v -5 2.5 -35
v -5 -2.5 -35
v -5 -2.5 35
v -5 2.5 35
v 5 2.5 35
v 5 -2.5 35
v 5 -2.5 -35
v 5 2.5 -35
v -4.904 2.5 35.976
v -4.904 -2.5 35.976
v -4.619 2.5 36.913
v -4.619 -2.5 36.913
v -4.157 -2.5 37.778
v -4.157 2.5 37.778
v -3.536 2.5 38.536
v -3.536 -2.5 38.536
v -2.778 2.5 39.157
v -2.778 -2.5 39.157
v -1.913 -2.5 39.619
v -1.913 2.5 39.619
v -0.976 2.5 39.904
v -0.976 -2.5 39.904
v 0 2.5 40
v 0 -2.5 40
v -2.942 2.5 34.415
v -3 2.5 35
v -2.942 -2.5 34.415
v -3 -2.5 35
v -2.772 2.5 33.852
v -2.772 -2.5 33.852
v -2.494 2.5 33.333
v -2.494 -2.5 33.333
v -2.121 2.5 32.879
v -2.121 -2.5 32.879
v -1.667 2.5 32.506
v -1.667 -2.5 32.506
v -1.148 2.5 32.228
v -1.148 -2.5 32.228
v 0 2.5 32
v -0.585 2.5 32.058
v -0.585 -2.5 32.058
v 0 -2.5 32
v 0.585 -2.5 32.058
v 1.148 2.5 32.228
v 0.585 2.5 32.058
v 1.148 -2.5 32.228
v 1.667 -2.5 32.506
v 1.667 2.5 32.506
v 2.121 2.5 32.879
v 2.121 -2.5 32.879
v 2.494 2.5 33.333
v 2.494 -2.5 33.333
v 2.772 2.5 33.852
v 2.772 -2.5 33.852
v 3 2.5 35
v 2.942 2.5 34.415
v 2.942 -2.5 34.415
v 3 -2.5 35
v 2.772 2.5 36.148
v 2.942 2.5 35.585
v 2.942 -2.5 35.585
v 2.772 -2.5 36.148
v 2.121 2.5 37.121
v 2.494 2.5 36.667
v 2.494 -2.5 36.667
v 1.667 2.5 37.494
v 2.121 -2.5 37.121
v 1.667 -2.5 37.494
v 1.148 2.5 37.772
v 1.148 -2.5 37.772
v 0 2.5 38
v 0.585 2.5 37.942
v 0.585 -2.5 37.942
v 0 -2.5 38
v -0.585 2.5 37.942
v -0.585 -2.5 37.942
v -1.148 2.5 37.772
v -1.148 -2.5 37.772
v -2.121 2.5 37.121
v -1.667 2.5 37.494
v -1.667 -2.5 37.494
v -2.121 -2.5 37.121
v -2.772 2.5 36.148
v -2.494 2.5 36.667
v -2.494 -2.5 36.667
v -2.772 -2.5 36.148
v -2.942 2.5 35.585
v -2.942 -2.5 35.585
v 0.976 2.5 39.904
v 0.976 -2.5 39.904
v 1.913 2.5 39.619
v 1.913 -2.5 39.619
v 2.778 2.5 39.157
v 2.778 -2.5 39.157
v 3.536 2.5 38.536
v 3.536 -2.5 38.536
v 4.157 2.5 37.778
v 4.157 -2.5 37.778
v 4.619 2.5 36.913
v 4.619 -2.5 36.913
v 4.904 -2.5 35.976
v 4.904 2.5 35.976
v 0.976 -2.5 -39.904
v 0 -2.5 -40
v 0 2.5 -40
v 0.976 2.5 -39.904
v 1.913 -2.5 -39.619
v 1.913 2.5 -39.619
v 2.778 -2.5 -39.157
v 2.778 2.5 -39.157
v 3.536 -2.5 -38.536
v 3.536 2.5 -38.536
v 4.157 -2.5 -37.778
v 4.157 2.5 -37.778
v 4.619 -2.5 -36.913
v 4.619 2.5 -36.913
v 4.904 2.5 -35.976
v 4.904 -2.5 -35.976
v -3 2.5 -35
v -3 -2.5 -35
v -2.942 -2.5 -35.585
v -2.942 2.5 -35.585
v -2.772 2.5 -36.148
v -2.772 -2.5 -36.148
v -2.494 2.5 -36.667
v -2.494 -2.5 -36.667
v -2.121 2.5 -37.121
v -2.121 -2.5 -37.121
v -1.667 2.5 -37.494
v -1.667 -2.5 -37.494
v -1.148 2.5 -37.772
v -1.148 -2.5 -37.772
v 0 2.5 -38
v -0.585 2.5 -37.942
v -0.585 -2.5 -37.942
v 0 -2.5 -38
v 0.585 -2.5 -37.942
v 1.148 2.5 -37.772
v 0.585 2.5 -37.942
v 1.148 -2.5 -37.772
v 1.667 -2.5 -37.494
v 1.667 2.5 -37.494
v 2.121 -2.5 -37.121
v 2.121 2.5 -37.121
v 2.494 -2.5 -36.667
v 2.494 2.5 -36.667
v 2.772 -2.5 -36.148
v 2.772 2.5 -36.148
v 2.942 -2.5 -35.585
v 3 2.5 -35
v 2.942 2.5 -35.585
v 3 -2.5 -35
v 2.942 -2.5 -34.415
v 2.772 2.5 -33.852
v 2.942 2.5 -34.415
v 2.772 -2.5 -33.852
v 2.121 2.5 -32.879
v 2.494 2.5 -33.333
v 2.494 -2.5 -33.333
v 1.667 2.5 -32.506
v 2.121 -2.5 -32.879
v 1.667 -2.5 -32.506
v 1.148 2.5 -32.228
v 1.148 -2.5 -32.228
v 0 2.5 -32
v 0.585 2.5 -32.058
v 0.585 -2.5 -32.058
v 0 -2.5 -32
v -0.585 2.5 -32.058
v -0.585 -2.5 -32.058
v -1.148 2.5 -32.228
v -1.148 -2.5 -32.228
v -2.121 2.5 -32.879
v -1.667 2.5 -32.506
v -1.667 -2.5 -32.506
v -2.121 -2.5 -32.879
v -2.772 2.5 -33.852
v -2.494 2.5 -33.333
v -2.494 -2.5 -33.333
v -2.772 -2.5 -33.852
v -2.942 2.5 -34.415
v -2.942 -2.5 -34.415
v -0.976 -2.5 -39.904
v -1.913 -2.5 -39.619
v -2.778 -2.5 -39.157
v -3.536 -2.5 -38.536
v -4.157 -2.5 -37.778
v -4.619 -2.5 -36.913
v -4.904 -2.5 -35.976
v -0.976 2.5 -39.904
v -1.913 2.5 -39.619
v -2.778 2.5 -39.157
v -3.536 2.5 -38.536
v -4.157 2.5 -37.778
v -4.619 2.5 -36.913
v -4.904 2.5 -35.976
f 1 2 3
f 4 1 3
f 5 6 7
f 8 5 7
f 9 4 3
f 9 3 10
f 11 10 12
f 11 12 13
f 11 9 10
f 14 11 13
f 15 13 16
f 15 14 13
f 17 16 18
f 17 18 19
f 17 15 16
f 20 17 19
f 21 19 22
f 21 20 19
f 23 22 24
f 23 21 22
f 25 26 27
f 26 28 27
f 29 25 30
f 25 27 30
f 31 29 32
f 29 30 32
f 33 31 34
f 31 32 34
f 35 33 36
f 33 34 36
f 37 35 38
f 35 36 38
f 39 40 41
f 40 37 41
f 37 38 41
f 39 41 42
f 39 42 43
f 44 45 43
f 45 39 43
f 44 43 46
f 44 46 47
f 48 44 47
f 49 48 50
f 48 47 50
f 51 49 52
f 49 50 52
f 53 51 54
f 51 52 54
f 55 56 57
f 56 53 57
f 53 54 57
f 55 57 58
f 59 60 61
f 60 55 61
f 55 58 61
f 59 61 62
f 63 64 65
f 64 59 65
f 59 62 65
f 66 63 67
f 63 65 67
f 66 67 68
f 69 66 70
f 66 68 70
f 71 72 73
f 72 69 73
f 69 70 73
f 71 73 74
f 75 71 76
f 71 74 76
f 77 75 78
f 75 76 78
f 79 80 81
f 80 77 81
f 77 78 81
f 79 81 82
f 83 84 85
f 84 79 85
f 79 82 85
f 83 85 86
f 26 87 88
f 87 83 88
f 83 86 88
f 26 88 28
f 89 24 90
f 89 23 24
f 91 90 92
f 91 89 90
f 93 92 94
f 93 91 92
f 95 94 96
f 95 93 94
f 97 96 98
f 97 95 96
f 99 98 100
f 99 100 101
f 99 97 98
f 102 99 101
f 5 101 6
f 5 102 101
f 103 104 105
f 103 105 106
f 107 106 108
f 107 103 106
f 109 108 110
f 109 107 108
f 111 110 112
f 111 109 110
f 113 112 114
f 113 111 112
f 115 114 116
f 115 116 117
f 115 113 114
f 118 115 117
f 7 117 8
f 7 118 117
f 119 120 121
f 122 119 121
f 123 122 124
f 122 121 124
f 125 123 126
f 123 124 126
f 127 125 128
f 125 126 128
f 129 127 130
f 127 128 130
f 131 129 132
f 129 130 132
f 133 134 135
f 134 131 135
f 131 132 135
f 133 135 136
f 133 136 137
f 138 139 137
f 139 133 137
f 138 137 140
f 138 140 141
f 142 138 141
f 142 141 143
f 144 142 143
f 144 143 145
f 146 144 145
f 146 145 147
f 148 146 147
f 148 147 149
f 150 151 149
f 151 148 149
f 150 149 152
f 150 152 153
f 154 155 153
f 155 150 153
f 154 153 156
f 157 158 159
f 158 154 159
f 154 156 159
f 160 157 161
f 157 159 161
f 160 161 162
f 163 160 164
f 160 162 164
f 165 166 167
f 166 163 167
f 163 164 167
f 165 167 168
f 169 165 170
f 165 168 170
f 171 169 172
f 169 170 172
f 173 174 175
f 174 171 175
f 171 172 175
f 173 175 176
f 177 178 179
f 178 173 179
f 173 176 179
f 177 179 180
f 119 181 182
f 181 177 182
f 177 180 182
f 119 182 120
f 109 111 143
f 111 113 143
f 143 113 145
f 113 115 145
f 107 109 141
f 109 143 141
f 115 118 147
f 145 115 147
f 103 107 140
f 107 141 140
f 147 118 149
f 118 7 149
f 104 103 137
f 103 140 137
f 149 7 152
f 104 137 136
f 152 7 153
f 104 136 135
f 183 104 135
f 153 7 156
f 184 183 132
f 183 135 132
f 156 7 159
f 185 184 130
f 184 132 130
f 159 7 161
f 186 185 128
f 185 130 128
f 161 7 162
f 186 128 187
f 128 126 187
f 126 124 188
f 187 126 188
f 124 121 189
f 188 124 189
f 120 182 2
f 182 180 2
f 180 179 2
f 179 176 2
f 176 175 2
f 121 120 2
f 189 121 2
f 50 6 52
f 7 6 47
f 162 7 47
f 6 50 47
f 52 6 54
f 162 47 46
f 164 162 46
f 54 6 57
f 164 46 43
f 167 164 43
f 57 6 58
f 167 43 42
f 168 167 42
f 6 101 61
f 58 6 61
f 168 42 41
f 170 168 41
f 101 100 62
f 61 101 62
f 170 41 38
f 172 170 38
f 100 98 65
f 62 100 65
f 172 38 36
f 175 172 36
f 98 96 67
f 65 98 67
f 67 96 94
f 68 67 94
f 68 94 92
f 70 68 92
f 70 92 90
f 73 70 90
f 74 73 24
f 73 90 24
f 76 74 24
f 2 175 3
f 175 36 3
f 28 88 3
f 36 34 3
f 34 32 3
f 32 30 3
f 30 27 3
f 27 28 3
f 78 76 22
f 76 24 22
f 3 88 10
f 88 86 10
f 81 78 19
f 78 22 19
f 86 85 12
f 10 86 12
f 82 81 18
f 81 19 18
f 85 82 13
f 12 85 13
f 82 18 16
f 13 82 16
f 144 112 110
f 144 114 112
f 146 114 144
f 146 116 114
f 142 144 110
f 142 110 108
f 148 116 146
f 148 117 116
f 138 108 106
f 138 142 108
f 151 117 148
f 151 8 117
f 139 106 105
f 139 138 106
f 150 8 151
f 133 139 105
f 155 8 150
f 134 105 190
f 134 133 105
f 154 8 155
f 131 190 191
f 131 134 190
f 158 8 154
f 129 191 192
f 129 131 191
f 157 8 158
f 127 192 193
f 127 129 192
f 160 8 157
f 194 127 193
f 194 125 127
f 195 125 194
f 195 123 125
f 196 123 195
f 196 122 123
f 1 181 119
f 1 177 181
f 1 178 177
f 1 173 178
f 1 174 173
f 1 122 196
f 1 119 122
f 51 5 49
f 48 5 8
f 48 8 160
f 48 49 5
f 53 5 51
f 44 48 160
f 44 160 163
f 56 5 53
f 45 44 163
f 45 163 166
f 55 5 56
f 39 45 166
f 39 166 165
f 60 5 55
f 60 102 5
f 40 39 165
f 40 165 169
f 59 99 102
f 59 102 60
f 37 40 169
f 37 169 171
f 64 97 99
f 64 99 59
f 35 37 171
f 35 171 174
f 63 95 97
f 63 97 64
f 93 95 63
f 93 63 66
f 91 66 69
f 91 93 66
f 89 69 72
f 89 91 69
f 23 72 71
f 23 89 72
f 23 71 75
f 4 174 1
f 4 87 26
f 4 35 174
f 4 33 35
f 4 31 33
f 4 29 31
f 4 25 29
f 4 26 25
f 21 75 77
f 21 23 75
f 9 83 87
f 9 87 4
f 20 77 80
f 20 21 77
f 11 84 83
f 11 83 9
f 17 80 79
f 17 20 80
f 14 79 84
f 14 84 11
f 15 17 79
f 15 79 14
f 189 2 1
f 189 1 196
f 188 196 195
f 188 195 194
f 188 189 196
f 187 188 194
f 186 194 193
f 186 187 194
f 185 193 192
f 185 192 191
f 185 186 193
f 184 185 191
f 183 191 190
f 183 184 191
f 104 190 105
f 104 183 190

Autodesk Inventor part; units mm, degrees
ref_plane "YZ Plane" through (0, 0, 0) normal (1, 0, 0) x (0, 1, 0)
ref_plane "XZ Plane" through (0, 0, 0) normal (0, 1, 0) x (-1, 0, 0)
ref_plane "XY Plane" through (0, 0, 0) normal (0, 0, 1) x (1, 0, 0)
sketch "Boceto1" plane through (0, 0, 0) normal (0, 1, 0) x (-1, 0, 0)
  line L0 (5, 40) -> (-5, 40)
  line L1 (-5, 40) -> (-5, -40)
  line L2 (-5, -40) -> (5, -40)
  line L3 (5, -40) -> (5, 40)
  line L4 (5, 40) -> (-5, -40) construction
  line L5 (-5, 40) -> (5, -40) construction
  circle A0 centre (0, 35) radius 3
  circle A1 centre (0, -35) radius 3
  point P0 (0, 0)
  dimension "d0" = 10
  dimension "d1" = 80
  dimension "d2" = 6
  dimension "d3" = 6
  dimension "d4" = 5
  dimension "d5" = 5
extrude "Extrusión1" add sketch "Boceto1" along normal mid plane 5
fillet "Empalme1" radius 5 4 edges at (-5, 0, 40) (5, 0, 40) (5, 0, -40) (-5, 0, -40)
properties material "Titanio"
